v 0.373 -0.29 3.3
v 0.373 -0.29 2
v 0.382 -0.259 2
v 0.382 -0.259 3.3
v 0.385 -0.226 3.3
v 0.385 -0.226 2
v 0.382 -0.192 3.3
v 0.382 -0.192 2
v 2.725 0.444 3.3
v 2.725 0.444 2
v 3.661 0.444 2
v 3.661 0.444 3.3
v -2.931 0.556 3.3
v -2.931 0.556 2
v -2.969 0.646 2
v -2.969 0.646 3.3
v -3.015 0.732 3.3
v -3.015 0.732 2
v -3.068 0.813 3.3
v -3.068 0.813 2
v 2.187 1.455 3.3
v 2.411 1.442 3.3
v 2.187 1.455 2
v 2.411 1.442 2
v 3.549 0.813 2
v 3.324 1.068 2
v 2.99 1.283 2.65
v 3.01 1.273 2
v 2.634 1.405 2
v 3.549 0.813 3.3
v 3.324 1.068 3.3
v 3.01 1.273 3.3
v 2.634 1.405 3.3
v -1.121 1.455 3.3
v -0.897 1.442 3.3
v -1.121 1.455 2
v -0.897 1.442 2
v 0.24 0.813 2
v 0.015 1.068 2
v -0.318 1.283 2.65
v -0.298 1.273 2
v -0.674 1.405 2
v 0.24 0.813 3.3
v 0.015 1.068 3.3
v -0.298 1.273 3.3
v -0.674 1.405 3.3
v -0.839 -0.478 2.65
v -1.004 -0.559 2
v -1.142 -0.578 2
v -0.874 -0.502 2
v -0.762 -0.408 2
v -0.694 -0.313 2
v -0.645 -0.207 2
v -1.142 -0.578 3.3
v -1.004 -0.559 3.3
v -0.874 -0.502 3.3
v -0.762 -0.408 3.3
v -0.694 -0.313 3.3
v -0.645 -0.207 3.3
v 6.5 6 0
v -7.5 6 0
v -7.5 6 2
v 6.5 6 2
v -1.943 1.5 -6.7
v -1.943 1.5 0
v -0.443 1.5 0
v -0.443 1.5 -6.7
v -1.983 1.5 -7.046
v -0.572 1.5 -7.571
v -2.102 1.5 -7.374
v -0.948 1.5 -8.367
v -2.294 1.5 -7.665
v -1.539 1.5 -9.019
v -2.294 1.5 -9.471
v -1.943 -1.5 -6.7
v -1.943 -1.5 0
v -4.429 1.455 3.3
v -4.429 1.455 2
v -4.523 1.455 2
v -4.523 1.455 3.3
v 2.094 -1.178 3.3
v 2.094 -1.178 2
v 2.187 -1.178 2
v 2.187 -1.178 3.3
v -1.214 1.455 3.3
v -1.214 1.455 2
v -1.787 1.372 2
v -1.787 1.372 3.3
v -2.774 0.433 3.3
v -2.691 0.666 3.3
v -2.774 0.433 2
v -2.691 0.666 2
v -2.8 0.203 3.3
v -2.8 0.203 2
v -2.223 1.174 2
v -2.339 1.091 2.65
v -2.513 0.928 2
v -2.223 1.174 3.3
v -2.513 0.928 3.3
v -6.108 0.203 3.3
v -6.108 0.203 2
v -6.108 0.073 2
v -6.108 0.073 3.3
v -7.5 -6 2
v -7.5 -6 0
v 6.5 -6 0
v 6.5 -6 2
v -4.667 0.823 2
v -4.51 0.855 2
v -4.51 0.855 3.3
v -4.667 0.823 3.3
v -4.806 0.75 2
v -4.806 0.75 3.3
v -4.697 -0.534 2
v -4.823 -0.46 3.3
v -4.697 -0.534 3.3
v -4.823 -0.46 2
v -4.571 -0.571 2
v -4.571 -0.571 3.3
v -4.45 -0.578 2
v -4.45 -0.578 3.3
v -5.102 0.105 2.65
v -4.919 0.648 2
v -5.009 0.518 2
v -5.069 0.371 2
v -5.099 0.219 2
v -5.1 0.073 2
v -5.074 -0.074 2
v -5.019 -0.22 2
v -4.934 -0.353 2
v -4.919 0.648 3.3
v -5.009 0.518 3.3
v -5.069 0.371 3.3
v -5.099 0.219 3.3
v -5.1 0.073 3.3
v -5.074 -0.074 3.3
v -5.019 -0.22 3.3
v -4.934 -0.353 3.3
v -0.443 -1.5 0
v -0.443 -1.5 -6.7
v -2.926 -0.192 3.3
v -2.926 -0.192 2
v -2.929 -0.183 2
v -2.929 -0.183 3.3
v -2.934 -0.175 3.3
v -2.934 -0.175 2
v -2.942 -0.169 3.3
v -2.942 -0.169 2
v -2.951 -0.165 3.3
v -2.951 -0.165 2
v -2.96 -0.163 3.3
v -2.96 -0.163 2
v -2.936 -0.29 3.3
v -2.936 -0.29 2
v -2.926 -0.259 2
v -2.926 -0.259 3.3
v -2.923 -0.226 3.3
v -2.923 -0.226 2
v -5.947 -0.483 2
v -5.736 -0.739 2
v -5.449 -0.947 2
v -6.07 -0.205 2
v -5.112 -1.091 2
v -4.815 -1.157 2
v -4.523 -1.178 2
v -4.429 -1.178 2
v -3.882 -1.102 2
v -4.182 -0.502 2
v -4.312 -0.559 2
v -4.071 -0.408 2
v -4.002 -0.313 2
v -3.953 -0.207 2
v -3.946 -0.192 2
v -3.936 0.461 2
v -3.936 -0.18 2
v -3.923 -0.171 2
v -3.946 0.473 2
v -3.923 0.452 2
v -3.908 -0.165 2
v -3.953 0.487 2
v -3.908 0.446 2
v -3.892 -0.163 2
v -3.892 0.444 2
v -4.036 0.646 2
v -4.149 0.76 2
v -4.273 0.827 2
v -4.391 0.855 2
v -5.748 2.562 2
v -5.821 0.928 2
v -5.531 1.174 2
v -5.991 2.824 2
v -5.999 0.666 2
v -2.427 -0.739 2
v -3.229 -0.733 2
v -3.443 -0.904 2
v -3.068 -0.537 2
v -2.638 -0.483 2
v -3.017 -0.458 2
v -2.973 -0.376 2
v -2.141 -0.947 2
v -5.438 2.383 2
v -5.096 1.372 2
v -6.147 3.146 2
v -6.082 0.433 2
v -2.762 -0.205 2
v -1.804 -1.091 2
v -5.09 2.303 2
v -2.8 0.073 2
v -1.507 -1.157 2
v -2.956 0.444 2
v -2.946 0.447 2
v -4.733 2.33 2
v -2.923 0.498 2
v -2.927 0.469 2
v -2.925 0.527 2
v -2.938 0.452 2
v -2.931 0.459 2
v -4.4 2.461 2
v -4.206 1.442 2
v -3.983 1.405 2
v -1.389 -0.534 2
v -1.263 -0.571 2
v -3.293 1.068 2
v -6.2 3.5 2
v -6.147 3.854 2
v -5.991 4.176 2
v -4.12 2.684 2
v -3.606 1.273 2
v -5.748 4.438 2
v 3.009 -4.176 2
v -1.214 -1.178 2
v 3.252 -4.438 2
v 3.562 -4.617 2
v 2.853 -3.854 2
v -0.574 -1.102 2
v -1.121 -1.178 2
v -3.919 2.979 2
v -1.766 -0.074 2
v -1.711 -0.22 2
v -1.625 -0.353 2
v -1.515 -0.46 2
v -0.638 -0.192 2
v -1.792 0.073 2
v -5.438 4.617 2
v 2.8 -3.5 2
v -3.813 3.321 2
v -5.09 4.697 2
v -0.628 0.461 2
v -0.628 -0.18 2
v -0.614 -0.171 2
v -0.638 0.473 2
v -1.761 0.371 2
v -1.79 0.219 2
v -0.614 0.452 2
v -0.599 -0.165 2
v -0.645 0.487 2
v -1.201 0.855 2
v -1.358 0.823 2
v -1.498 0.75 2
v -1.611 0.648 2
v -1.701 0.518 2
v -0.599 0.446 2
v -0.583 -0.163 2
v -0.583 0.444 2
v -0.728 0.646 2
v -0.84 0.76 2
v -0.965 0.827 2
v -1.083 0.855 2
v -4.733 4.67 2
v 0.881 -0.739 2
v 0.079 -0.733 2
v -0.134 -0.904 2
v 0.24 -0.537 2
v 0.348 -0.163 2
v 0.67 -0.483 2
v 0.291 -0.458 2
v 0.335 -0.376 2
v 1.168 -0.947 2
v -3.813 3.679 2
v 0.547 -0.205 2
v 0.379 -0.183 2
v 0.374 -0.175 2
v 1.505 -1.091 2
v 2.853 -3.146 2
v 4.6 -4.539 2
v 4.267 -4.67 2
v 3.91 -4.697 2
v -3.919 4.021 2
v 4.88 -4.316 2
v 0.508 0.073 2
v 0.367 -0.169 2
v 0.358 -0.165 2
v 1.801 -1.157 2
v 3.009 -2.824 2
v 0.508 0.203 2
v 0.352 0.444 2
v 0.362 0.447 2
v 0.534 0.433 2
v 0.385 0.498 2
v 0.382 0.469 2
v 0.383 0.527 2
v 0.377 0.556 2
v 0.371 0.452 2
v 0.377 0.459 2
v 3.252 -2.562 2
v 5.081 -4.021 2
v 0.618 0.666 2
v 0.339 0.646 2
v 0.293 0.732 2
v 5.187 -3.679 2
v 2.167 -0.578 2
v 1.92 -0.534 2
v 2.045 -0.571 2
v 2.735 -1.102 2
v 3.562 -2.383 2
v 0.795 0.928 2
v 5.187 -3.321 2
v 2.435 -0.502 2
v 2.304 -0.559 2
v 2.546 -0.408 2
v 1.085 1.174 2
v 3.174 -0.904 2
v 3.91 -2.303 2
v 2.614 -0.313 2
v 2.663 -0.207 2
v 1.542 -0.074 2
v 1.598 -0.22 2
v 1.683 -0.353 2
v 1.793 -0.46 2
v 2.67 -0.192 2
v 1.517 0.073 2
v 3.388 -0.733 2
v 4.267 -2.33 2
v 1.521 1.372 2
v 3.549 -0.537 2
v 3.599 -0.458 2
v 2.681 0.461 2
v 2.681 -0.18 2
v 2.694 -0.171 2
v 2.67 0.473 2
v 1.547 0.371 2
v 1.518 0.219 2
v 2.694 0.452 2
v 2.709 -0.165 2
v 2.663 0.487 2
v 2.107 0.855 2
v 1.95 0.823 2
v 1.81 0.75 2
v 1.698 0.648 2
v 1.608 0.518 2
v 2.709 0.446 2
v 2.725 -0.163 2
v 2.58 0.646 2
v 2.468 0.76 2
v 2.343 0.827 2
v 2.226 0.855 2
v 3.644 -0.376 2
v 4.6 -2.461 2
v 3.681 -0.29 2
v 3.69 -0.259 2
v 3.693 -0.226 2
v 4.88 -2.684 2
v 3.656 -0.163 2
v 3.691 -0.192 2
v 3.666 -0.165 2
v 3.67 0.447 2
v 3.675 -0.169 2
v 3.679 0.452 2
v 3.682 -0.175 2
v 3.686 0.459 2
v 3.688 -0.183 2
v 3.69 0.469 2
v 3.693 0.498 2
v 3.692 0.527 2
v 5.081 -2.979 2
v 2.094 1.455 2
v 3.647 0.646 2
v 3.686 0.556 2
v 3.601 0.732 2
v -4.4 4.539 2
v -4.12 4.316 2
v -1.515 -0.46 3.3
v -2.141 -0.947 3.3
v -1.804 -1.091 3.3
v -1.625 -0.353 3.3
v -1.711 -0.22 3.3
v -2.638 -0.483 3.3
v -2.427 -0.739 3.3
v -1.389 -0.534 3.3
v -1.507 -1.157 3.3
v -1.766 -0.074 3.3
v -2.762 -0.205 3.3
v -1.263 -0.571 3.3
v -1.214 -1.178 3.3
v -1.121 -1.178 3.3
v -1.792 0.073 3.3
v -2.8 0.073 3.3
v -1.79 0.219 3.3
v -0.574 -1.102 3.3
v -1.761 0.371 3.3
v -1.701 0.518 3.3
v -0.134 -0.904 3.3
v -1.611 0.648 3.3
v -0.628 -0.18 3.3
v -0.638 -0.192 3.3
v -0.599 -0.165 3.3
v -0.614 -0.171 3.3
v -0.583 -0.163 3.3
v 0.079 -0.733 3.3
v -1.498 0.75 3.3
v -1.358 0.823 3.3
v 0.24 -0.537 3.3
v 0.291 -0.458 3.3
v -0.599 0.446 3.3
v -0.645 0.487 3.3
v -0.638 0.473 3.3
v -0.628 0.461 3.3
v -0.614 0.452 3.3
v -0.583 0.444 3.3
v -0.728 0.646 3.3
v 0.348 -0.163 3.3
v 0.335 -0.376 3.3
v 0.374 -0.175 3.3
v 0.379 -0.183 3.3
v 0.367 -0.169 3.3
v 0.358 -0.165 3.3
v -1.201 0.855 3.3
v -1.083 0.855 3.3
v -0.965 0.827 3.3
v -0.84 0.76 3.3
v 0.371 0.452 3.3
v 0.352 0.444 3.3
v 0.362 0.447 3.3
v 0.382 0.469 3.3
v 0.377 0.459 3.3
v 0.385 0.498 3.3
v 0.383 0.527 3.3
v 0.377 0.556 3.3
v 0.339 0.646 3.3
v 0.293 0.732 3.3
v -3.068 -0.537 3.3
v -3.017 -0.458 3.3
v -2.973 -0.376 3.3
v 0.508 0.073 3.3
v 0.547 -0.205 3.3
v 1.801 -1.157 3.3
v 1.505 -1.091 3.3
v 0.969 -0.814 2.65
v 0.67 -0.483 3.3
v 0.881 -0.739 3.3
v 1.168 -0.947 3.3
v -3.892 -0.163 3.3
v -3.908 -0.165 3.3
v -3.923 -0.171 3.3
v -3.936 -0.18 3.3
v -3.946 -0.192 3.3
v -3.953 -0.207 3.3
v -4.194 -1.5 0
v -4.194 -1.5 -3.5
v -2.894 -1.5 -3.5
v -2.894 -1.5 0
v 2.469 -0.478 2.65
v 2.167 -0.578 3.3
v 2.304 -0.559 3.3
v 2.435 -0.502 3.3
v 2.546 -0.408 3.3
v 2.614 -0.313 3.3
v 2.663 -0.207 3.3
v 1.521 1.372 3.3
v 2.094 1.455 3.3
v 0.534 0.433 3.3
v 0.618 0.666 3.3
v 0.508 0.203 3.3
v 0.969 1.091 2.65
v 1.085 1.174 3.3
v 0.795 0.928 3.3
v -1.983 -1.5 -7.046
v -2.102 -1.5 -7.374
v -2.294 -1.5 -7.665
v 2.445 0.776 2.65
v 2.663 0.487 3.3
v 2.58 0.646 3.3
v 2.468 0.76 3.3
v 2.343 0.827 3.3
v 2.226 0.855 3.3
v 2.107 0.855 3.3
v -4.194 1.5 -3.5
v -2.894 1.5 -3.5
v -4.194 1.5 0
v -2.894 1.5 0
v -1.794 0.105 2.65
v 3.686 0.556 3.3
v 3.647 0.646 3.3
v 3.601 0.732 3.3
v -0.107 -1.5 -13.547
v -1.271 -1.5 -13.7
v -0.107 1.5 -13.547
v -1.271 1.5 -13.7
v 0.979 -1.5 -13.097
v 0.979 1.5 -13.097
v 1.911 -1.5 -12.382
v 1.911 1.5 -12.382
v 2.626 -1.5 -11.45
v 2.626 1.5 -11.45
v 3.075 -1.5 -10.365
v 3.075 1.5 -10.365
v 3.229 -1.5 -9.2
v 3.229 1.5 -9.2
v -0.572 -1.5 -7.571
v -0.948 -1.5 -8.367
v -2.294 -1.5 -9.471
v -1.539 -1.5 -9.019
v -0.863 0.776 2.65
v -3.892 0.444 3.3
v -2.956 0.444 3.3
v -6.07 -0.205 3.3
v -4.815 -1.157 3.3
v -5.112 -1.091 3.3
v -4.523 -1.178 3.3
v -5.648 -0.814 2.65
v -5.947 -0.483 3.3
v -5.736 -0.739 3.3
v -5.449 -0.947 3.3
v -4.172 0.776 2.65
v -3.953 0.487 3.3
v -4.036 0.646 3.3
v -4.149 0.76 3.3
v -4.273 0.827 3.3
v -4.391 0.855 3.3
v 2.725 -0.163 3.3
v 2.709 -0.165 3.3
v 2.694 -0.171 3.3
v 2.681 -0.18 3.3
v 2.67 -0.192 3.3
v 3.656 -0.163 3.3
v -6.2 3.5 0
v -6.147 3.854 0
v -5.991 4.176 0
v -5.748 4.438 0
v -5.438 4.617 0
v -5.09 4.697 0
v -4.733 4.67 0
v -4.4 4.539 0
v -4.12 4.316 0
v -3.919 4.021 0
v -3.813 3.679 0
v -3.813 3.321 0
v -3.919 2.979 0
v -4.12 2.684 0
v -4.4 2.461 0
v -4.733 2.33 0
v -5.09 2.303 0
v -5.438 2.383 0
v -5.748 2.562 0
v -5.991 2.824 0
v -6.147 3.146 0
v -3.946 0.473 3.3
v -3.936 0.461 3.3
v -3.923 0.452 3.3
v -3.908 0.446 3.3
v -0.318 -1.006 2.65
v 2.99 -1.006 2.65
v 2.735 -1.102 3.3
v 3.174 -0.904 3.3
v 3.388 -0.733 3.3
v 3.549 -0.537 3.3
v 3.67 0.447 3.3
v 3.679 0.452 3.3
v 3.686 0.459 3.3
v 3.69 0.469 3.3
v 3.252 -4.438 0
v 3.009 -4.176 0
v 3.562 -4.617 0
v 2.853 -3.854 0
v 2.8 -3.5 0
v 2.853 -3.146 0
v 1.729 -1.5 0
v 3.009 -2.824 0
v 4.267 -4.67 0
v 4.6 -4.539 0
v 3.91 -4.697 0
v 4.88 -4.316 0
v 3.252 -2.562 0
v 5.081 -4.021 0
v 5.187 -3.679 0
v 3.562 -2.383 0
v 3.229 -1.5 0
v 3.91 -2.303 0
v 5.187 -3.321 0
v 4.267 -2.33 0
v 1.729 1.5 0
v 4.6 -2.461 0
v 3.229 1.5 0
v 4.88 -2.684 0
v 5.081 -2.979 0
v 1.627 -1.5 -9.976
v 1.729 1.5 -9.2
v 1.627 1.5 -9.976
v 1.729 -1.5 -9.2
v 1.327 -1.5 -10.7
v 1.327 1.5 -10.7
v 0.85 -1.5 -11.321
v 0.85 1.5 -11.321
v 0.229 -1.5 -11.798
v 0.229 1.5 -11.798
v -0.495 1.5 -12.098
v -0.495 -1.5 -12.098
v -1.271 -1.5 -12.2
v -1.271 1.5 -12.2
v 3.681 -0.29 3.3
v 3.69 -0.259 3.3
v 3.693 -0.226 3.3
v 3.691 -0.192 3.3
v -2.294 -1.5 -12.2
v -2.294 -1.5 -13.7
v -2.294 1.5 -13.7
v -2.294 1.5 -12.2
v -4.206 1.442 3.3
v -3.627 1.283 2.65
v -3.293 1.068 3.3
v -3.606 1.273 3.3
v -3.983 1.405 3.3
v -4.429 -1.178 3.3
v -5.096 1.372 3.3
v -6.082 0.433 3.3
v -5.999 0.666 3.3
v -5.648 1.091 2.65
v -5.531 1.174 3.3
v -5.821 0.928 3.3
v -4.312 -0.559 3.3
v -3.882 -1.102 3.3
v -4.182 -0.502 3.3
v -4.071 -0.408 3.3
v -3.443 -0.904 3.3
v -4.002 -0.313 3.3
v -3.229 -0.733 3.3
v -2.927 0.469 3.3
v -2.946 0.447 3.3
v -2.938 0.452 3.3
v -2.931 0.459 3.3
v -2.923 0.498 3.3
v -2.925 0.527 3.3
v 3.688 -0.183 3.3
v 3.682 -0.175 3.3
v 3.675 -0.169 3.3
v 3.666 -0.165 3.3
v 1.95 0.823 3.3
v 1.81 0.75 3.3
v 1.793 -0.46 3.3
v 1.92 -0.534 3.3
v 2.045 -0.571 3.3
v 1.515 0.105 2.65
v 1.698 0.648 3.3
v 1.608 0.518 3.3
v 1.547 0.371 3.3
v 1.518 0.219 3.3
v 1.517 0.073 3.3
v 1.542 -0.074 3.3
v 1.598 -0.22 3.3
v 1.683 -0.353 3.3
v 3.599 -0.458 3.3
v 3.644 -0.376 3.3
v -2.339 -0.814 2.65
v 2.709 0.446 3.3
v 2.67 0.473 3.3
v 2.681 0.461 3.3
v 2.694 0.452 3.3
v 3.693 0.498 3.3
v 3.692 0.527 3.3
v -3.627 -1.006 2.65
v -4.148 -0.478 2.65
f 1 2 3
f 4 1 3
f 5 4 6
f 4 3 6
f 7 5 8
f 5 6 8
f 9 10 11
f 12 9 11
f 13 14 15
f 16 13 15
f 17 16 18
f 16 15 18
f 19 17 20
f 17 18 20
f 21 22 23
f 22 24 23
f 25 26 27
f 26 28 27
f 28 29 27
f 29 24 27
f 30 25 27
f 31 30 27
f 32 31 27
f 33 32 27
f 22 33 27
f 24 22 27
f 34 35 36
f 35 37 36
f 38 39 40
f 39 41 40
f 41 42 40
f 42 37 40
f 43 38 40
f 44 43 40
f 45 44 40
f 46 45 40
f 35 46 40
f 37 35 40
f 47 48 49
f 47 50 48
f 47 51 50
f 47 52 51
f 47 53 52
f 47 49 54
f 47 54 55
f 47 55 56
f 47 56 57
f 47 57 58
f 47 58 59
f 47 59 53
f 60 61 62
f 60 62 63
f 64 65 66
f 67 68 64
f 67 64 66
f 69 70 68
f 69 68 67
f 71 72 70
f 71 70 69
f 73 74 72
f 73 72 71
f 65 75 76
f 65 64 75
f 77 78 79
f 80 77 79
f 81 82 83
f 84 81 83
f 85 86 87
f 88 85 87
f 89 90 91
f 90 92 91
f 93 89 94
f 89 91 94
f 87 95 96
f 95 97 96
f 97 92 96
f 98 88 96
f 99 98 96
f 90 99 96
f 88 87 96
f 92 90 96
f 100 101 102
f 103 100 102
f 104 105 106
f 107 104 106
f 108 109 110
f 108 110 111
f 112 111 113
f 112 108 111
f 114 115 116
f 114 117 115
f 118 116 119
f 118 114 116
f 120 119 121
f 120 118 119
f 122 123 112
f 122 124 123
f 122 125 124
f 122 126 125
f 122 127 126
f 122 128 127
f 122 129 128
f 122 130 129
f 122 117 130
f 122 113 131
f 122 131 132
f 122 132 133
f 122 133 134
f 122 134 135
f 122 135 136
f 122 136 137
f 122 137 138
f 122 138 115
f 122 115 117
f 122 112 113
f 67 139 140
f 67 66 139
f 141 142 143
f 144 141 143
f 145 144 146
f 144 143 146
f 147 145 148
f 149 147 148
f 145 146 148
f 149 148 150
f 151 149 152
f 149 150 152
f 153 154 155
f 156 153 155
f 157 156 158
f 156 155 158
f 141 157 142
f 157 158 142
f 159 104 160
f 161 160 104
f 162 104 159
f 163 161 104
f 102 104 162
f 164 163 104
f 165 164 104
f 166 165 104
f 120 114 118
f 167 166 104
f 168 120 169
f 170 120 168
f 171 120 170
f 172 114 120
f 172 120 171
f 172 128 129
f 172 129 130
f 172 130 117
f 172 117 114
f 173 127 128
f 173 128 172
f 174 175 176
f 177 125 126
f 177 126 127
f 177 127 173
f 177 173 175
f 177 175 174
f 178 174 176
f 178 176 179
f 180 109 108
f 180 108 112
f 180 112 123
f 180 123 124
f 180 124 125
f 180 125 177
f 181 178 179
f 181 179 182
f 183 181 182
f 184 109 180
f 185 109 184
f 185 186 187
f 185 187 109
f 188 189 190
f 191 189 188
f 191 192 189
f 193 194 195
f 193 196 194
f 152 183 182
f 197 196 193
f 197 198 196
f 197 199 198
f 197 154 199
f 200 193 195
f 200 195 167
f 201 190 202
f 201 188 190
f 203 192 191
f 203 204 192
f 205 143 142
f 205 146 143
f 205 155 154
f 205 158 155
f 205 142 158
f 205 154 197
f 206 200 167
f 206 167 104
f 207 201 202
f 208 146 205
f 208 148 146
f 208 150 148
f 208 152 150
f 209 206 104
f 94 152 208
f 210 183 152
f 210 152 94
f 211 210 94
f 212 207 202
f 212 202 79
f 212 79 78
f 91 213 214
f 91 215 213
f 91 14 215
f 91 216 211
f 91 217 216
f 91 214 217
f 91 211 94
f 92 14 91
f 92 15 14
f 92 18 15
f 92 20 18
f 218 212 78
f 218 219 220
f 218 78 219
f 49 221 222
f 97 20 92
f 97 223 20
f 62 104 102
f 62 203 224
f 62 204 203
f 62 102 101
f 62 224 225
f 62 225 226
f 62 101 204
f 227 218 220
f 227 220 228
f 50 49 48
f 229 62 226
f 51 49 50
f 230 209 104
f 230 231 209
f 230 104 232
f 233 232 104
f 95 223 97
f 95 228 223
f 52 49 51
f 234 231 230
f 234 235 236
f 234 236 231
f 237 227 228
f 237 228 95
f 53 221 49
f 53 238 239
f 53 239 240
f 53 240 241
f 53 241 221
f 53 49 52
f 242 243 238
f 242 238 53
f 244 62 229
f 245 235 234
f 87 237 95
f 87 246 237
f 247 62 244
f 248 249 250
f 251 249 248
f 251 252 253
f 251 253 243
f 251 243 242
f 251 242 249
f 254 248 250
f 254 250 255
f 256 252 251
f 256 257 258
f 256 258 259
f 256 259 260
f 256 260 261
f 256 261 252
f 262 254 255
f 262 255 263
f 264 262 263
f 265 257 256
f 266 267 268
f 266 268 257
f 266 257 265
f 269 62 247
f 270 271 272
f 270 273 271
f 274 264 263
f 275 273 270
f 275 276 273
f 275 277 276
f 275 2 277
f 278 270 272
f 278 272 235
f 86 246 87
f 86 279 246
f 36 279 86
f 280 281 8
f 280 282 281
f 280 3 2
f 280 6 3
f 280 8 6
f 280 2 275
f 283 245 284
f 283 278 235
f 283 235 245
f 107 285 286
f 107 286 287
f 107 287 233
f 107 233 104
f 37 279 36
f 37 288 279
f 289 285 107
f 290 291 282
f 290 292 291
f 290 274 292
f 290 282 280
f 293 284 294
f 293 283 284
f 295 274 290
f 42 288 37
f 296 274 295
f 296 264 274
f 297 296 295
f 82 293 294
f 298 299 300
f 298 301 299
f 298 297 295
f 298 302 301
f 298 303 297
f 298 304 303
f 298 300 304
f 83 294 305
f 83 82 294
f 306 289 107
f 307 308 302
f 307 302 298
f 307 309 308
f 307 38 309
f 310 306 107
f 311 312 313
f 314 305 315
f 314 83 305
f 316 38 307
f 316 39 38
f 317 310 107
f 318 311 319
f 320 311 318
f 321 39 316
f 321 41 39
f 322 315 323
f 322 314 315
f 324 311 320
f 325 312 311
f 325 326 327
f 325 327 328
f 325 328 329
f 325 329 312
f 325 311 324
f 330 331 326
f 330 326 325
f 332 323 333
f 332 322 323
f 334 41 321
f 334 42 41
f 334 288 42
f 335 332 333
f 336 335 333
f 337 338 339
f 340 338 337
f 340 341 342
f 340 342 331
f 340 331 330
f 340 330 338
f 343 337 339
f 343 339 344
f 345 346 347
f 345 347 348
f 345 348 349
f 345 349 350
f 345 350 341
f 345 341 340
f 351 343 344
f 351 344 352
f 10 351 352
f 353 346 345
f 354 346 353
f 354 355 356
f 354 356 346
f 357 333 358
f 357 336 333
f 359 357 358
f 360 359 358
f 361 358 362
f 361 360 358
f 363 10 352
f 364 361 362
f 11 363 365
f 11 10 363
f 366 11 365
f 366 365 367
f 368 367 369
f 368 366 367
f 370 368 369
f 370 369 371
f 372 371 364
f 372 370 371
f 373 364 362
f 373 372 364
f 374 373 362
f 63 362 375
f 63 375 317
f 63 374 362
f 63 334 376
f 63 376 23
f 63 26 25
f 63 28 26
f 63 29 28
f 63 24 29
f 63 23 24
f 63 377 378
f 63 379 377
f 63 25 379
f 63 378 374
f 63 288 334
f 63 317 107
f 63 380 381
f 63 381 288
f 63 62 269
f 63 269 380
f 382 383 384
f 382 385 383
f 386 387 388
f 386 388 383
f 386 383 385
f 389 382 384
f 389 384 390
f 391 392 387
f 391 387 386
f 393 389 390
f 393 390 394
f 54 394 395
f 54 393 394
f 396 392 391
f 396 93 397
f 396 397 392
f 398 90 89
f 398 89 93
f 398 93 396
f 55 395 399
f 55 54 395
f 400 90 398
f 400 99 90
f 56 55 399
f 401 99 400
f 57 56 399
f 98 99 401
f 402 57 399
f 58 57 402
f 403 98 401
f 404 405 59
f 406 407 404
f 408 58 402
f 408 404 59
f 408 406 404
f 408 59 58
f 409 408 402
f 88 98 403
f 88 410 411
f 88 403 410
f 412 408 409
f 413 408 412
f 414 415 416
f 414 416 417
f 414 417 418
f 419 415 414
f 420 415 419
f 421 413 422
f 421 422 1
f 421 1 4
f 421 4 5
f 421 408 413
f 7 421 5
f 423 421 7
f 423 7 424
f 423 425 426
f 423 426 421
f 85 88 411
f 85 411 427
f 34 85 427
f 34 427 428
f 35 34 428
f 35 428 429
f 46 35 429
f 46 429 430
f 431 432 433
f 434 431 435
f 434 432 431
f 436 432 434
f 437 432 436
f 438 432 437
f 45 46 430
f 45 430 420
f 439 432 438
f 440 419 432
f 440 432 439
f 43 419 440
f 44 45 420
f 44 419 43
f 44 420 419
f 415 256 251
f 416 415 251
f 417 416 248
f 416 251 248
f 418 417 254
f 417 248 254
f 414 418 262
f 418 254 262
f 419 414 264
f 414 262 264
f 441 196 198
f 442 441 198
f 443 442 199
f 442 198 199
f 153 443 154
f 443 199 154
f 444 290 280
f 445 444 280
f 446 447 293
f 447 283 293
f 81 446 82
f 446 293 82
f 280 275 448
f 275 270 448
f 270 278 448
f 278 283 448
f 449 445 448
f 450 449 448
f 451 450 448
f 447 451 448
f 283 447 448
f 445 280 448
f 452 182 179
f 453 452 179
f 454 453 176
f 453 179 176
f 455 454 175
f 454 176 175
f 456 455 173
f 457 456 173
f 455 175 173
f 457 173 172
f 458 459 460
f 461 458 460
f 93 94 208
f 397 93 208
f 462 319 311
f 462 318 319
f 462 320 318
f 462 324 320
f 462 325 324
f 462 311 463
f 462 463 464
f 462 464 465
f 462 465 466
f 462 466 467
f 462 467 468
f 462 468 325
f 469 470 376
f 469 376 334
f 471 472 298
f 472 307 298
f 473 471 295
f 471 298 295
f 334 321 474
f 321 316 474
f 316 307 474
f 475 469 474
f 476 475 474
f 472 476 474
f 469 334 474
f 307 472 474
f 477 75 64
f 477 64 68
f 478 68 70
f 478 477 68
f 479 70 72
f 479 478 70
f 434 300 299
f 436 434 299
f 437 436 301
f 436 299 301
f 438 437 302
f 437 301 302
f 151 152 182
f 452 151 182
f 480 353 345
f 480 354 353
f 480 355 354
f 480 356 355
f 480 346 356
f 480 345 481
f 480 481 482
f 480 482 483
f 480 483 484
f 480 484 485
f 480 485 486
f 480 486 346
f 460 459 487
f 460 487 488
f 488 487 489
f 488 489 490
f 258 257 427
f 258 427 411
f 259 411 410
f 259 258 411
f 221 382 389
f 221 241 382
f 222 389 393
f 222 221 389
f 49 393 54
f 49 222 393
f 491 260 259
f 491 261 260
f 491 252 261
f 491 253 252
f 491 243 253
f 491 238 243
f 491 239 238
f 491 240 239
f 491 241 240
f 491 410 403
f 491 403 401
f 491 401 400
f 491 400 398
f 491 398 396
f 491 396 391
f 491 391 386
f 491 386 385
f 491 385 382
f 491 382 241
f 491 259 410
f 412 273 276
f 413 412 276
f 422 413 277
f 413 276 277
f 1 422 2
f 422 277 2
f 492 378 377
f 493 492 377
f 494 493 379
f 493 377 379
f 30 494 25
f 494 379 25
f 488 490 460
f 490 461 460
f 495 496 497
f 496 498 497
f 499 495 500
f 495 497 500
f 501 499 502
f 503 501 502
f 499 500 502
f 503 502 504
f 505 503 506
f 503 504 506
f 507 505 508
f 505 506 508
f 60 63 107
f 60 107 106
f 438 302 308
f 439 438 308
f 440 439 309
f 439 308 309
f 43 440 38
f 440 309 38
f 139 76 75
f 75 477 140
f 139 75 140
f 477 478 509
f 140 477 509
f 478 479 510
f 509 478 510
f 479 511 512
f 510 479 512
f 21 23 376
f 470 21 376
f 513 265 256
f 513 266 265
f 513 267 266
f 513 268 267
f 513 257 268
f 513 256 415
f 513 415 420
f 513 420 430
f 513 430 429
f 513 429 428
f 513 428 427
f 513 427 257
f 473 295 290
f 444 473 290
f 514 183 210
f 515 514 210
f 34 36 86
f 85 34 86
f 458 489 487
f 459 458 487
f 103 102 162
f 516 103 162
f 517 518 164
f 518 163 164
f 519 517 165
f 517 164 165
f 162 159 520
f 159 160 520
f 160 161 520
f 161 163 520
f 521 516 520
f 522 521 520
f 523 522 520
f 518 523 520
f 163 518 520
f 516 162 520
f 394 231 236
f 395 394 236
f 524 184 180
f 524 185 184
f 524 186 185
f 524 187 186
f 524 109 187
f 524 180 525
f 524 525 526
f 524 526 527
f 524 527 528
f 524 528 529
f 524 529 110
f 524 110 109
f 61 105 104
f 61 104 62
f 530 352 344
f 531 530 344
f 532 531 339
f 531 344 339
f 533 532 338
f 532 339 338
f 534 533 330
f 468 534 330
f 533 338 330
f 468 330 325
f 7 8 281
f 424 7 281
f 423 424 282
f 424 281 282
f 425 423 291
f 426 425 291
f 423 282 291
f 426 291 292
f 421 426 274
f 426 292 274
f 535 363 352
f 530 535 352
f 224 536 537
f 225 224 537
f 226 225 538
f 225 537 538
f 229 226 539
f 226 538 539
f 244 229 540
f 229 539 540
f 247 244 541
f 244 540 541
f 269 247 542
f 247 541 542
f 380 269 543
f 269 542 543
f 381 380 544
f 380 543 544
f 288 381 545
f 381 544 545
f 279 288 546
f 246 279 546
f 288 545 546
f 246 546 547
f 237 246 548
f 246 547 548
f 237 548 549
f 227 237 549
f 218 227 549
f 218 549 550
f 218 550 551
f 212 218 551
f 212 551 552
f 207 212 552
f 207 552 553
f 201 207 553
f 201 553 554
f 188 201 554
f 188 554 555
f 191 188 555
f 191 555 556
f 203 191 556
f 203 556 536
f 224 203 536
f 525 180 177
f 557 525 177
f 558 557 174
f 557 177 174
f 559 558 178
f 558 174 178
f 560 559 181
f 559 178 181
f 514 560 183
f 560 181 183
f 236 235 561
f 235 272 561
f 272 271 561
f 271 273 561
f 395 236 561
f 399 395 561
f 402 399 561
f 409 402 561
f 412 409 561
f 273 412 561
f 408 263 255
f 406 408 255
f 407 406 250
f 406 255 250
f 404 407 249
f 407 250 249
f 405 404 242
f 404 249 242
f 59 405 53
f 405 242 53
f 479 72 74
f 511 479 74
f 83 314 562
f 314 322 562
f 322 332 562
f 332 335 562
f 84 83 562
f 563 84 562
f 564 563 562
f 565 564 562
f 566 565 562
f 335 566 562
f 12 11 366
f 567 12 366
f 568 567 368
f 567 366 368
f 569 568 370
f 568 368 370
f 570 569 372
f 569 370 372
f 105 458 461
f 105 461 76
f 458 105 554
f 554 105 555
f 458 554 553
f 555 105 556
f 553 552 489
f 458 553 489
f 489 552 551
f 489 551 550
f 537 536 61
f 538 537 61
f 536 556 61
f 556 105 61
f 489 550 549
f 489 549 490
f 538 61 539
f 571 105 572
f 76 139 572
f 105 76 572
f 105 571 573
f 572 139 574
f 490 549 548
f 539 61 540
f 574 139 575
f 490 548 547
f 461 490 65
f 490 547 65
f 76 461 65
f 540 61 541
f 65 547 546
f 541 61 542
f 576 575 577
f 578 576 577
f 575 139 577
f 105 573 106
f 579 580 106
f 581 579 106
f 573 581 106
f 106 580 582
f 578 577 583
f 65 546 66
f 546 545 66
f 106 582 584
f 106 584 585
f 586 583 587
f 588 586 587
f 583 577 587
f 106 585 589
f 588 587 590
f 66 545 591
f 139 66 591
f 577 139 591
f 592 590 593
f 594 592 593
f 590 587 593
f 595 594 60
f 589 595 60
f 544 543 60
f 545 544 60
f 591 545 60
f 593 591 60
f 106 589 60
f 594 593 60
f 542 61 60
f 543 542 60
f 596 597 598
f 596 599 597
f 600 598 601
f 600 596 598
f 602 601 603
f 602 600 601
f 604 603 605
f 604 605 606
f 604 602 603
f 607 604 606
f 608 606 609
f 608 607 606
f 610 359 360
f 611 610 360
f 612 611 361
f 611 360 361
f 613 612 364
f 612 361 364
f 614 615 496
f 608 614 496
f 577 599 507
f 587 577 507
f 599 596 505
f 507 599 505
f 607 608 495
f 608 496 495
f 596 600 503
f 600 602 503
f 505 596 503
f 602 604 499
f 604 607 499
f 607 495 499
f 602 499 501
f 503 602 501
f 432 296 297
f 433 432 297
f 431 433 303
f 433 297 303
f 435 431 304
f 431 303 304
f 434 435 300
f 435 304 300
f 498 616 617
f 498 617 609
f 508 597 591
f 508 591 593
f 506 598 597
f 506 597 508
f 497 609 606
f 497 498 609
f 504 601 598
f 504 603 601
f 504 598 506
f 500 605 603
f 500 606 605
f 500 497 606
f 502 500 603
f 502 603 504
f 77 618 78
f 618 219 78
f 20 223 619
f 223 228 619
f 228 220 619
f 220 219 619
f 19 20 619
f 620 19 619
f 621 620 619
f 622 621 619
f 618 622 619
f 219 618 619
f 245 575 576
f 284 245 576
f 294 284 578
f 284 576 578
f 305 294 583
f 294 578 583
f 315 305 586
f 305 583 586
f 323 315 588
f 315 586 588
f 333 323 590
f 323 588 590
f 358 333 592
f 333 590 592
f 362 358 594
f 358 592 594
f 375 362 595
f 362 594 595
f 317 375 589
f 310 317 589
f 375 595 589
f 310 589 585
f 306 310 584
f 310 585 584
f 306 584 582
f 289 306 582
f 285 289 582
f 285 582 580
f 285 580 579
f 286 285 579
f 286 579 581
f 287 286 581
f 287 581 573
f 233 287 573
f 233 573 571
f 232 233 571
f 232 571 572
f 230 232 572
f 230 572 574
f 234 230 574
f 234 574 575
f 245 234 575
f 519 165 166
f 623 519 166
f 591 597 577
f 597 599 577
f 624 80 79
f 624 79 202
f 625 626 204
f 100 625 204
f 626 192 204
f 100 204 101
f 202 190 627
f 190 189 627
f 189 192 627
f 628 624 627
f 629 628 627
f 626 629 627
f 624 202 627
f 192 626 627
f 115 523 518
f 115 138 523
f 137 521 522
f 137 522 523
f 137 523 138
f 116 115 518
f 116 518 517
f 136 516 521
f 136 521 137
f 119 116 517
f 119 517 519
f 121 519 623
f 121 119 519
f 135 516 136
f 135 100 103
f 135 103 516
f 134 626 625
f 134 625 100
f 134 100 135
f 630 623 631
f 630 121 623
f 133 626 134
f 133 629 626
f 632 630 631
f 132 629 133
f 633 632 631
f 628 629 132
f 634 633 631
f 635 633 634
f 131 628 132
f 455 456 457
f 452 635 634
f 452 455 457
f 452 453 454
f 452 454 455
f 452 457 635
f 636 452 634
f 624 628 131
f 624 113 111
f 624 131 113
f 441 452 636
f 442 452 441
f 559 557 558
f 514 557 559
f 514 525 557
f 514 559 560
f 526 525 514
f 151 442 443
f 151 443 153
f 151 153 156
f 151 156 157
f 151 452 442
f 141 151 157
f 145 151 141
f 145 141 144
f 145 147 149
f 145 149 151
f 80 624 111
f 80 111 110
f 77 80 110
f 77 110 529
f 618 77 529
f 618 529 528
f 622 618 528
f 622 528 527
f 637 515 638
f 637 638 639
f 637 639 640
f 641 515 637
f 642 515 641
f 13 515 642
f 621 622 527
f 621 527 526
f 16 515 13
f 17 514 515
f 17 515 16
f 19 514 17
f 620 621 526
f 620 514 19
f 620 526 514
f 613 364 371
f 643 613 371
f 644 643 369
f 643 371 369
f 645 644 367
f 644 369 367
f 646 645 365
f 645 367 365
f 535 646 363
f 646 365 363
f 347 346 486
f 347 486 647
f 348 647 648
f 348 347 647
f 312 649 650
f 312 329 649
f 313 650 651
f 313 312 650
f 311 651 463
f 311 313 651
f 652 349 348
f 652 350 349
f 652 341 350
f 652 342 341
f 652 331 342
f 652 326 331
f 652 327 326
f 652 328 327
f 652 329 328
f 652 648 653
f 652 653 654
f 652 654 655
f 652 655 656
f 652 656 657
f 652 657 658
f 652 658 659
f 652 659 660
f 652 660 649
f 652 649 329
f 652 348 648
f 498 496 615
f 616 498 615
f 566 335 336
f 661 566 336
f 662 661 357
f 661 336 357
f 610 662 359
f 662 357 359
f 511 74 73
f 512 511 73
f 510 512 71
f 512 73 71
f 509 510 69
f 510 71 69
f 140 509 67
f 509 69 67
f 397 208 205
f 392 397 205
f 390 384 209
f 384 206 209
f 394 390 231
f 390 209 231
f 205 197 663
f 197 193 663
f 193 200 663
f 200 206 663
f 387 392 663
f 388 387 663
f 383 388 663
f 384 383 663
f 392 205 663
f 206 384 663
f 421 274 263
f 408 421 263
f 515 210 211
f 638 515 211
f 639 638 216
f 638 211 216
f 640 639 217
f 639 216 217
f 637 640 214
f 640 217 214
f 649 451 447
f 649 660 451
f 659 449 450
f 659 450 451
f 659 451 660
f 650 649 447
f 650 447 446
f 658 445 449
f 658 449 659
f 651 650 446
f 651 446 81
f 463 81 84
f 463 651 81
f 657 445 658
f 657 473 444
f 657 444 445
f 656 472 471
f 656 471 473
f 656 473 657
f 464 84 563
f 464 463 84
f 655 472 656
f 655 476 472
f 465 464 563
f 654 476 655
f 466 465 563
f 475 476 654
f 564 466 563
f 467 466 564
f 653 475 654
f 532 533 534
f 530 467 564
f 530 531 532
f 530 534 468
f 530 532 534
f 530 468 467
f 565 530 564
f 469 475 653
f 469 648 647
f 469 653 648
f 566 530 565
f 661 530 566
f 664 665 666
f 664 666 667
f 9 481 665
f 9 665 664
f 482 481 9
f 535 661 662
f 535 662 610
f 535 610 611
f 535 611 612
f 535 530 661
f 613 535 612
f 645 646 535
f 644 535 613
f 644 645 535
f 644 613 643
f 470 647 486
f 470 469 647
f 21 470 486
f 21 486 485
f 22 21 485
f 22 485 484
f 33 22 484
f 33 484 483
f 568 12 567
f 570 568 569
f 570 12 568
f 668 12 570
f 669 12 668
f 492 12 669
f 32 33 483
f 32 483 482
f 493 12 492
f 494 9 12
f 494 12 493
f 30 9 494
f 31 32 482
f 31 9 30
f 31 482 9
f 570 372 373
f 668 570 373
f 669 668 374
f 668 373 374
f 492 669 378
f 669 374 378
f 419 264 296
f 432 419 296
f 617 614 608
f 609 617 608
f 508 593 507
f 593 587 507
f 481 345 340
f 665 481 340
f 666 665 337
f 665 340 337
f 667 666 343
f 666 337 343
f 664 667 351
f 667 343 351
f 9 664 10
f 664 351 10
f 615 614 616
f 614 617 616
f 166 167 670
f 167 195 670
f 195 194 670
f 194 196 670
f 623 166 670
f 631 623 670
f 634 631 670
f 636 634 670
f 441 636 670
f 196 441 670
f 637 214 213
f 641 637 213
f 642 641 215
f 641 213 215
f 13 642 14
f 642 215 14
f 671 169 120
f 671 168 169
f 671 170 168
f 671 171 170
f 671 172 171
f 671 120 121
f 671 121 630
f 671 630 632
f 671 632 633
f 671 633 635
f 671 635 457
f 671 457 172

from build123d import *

# Parameters (mm, degrees)
SKETCH1_W           = 15
SKETCH1_H           = 12
BOSS_EXTRUDE1_DEPTH = 2
BOSS_EXTRUDE2_DEPTH = 2
SKETCH3_W           = 1.5
SKETCH3_H           = 3.5
BOSS_EXTRUDE3_DEPTH = 1.5
FILLET3_R           = 1.5
FILLET4_R           = 3
FILLET5_R           = 3
FILLET6_R           = 4.5
SKETCH4_W           = 2
SKETCH4_H           = 12
CUT_EXTRUDE1_DEPTH  = 1
SKETCH5_R           = 1.2
CUT_EXTRUDE2_DEPTH  = 17.731407672
CUT_EXTRUDE3_START  = -0.7
CUT_EXTRUDE3_DEPTH  = 0.7
SKETCH7_W           = 1.148621372
SKETCH7_H           = 6.2
CUT_EXTRUDE4_DEPTH  = 18.325992122
SKETCH8_W           = 0.2
SKETCH8_H           = 3.5
CUT_EXTRUDE5_DEPTH  = 18.325992122


with BuildPart() as part:
    # Sketch1 → Boss-Extrude1 (new body)
    with BuildSketch(Plane.XY):
        Rectangle(SKETCH1_W, SKETCH1_H)
    extrude(amount=BOSS_EXTRUDE1_DEPTH)

    # Sketch2 → Boss-Extrude2 (add)
    with BuildSketch(Plane.XY.offset(2)):
        with BuildLine():
            Line((-0.583484164, 0.443787032), (0.352350759, 0.443787032))
            ThreePointArc((0.352350759, 0.443787032), (0.370660979, 0.451874829), (0.381594807, 0.468641703))
            ThreePointArc((0.381594807, 0.468641703), (0.38478126, 0.512633483), (0.377406248, 0.556119567))
            ThreePointArc((0.377406248, 0.556119567), (0.316958398, 0.689104808), (0.240244136, 0.81341868))
            add(Edge.make_bspline(
                [(0.240244136, 0.81341868), (-0.178053426, 1.454553053), (-1.120854898, 1.454553053)],
                knots=[3.484341046, 3.484341046, 3.484341046, 4.522924348, 4.522924348, 4.522924348], degree=2, weights=[1, 0.868170926, 1]))
            Line((-1.120854898, 1.454553053), (-1.214475951, 1.454553068))
            add(Edge.make_bspline(
                [(-1.214475951, 1.454553068), (-2.800132813, 1.454553068), (-2.800132813, 0.203397992)],
                knots=[1.670440536, 1.670440536, 1.670440536, 3.203377674, 3.203377674, 3.203377674], degree=2, weights=[1, 0.720364542, 1]))
            Line((-2.800132813, 0.203397992), (-2.800132806, 0.073267738))
            add(Edge.make_bspline(
                [(-2.800132806, 0.073267738), (-2.800132806, -1.177887338), (-1.214475944, -1.177887338)],
                knots=[3.079807634, 3.079807634, 3.079807634, 4.612744771, 4.612744771, 4.612744771], degree=2, weights=[1, 0.720364542, 1]))
            Line((-1.214475944, -1.177887338), (-1.120854891, -1.177887375))
            add(Edge.make_bspline(
                [(-1.120854891, -1.177887375), (-0.178053419, -1.177887375), (0.240244143, -0.536753002)],
                knots=[1.760260959, 1.760260959, 1.760260959, 2.798844261, 2.798844261, 2.798844261], degree=2, weights=[1, 0.868170926, 1]))
            ThreePointArc((0.240244143, -0.536753002), (0.313994237, -0.417650167), (0.372658208, -0.290437354))
            ThreePointArc((0.372658208, -0.290437354), (0.384251196, -0.24211404), (0.382489087, -0.192450825))
            ThreePointArc((0.382489087, -0.192450825), (0.370484527, -0.171527836), (0.347824512, -0.163257123))
            Line((0.347824512, -0.163257123), (-0.58348421, -0.163257123))
            ThreePointArc((-0.58348421, -0.163257123), (-0.62125204, -0.175257922), (-0.645165579, -0.206858093))
            add(Edge.make_bspline(
                [(-1.141657158, -0.577741646), (-0.776549247, -0.578100851), (-0.645165579, -0.206858093)],
                knots=[5.955155363, 5.955155363, 5.955155363, 7.020735545, 7.020735545, 7.020735545], degree=2, weights=[1, 0.86139323, 1]))
            add(Edge.make_bspline(
                [(-1.201450314, 0.854894524), (-1.823540048, 0.823436889), (-1.793554178, 0.104979402), (-1.763568309, -0.613478086), (-1.141657158, -0.577741646)],
                knots=[0.039432941, 0.039432941, 0.039432941, 1.613207044, 1.613207044, 3.186981147, 3.186981147, 3.186981147], degree=2, weights=[1, 0.706053195, 1, 0.706053195, 1]))
            add(Edge.make_bspline(
                [(-0.645165584, 0.487388037), (-0.79140441, 0.900606071), (-1.201450314, 0.854894524)],
                knots=[2.404042441, 2.404042441, 2.404042441, 3.565685694, 3.565685694, 3.565685694], degree=2, weights=[1, 0.836012096, 1]))
            ThreePointArc((-0.645165584, 0.487388037), (-0.621252025, 0.455787841), (-0.583484164, 0.443787032))
        make_face()
        with BuildLine():
            Line((-3.89178871, 0.443787032), (-2.955953786, 0.443787032))
            ThreePointArc((-2.955953786, 0.443787032), (-2.937643536, 0.451874816), (-2.926709688, 0.468641703))
            ThreePointArc((-2.926709688, 0.468641703), (-2.923523234, 0.512633483), (-2.930898247, 0.556119567))
            ThreePointArc((-2.930898247, 0.556119567), (-2.991346096, 0.689104808), (-3.068060358, 0.81341868))
            add(Edge.make_bspline(
                [(-3.068060358, 0.81341868), (-3.48635792, 1.454553053), (-4.429159392, 1.454553053)],
                knots=[3.484341046, 3.484341046, 3.484341046, 4.522924348, 4.522924348, 4.522924348], degree=2, weights=[1, 0.868170926, 1]))
            Line((-4.429159392, 1.454553053), (-4.522780446, 1.454553068))
            add(Edge.make_bspline(
                [(-4.522780446, 1.454553068), (-6.108437307, 1.454553068), (-6.108437307, 0.203397992)],
                knots=[4.81203319, 4.81203319, 4.81203319, 6.344970327, 6.344970327, 6.344970327], degree=2, weights=[1, 0.720364542, 1]))
            Line((-6.108437307, 0.203397992), (-6.108437352, 0.073267738))
            add(Edge.make_bspline(
                [(-6.108437352, 0.073267738), (-6.108437352, -1.177887338), (-4.52278049, -1.177887338)],
                knots=[6.221400287, 6.221400287, 6.221400287, 7.754337425, 7.754337425, 7.754337425], degree=2, weights=[1, 0.720364542, 1]))
            Line((-4.52278049, -1.177887338), (-4.429159437, -1.177887375))
            add(Edge.make_bspline(
                [(-4.429159437, -1.177887375), (-3.486357965, -1.177887375), (-3.068060402, -0.536753002)],
                knots=[1.760260959, 1.760260959, 1.760260959, 2.798844261, 2.798844261, 2.798844261], degree=2, weights=[1, 0.868170926, 1]))
            ThreePointArc((-3.068060402, -0.536753002), (-2.994310308, -0.417650167), (-2.935646337, -0.290437354))
            ThreePointArc((-2.935646337, -0.290437354), (-2.92405335, -0.24211404), (-2.925815458, -0.192450825))
            ThreePointArc((-2.925815458, -0.192450825), (-2.937820019, -0.171527836), (-2.960480033, -0.163257123))
            Line((-2.960480033, -0.163257123), (-3.891788755, -0.163257123))
            ThreePointArc((-3.891788755, -0.163257123), (-3.929556585, -0.175257922), (-3.953470124, -0.206858093))
            add(Edge.make_bspline(
                [(-4.449961703, -0.577741646), (-4.084853792, -0.578100851), (-3.953470124, -0.206858093)],
                knots=[5.955155363, 5.955155363, 5.955155363, 7.020735545, 7.020735545, 7.020735545], degree=2, weights=[1, 0.86139323, 1]))
            add(Edge.make_bspline(
                [(-4.509754859, 0.854894524), (-5.131844593, 0.82343689), (-5.101858724, 0.104979402), (-5.071872854, -0.613478086), (-4.449961703, -0.577741646)],
                knots=[0.039432941, 0.039432941, 0.039432941, 1.613207044, 1.613207044, 3.186981147, 3.186981147, 3.186981147], degree=2, weights=[1, 0.706053195, 1, 0.706053195, 1]))
            add(Edge.make_bspline(
                [(-3.95347013, 0.487388037), (-4.099708956, 0.900606071), (-4.509754859, 0.854894524)],
                knots=[2.40404244, 2.40404244, 2.40404244, 3.565685694, 3.565685694, 3.565685694], degree=2, weights=[1, 0.836012096, 1]))
            ThreePointArc((-3.95347013, 0.487388037), (-3.92955657, 0.455787841), (-3.89178871, 0.443787032))
        make_face()
        with BuildLine():
            Line((2.724820382, 0.443787032), (3.660655305, 0.443787032))
            ThreePointArc((3.660655305, 0.443787032), (3.678965525, 0.451874829), (3.689899353, 0.468641703))
            ThreePointArc((3.689899353, 0.468641703), (3.693085806, 0.512633483), (3.685710794, 0.556119567))
            ThreePointArc((3.685710794, 0.556119567), (3.625262944, 0.689104808), (3.548548682, 0.81341868))
            add(Edge.make_bspline(
                [(3.548548682, 0.81341868), (3.13025112, 1.454553053), (2.187449648, 1.454553053)],
                knots=[0.342748392, 0.342748392, 0.342748392, 1.381331695, 1.381331695, 1.381331695], degree=2, weights=[1, 0.868170926, 1]))
            Line((2.187449648, 1.454553053), (2.093828595, 1.454553068))
            add(Edge.make_bspline(
                [(2.093828595, 1.454553068), (0.508171733, 1.454553068), (0.508171733, 0.203397992)],
                knots=[4.81203319, 4.81203319, 4.81203319, 6.344970327, 6.344970327, 6.344970327], degree=2, weights=[1, 0.720364542, 1]))
            Line((0.508171733, 0.203397992), (0.50817174, 0.073267738))
            add(Edge.make_bspline(
                [(0.50817174, 0.073267738), (0.50817174, -1.177887338), (2.093828602, -1.177887338)],
                knots=[3.079807634, 3.079807634, 3.079807634, 4.612744771, 4.612744771, 4.612744771], degree=2, weights=[1, 0.720364542, 1]))
            Line((2.093828602, -1.177887338), (2.187449655, -1.177887375))
            add(Edge.make_bspline(
                [(2.187449655, -1.177887375), (3.130251127, -1.177887375), (3.548548689, -0.536753002)],
                knots=[1.760260959, 1.760260959, 1.760260959, 2.798844261, 2.798844261, 2.798844261], degree=2, weights=[1, 0.868170926, 1]))
            ThreePointArc((3.548548689, -0.536753002), (3.622298783, -0.417650167), (3.680962754, -0.290437354))
            ThreePointArc((3.680962754, -0.290437354), (3.692555742, -0.24211404), (3.690793633, -0.192450825))
            ThreePointArc((3.690793633, -0.192450825), (3.678789073, -0.171527836), (3.656129058, -0.163257123))
            Line((3.656129058, -0.163257123), (2.724820336, -0.163257123))
            ThreePointArc((2.724820336, -0.163257123), (2.687052506, -0.175257922), (2.663138967, -0.206858093))
            add(Edge.make_bspline(
                [(2.166647388, -0.577741646), (2.531755299, -0.578100851), (2.663138967, -0.206858093)],
                knots=[5.955155363, 5.955155363, 5.955155363, 7.020735545, 7.020735545, 7.020735545], degree=2, weights=[1, 0.86139323, 1]))
            add(Edge.make_bspline(
                [(2.106854232, 0.854894524), (1.484764498, 0.823436889), (1.514750368, 0.104979402), (1.544736237, -0.613478086), (2.166647388, -0.577741646)],
                knots=[3.181025595, 3.181025595, 3.181025595, 4.754799698, 4.754799698, 6.328573801, 6.328573801, 6.328573801], degree=2, weights=[1, 0.706053195, 1, 0.706053195, 1]))
            add(Edge.make_bspline(
                [(2.663138962, 0.487388037), (2.516900136, 0.900606071), (2.106854232, 0.854894524)],
                knots=[5.545635094, 5.545635094, 5.545635094, 6.707278348, 6.707278348, 6.707278348], degree=2, weights=[1, 0.836012096, 1]))
            ThreePointArc((2.663138962, 0.487388037), (2.687052521, 0.455787841), (2.724820382, 0.443787032))
        make_face()
    extrude(amount=BOSS_EXTRUDE2_DEPTH)

    # Sketch3 → Boss-Extrude3 (add, symmetric)
    with BuildSketch(Plane(origin=(0, 0, 0), x_dir=(1, 0, 0), z_dir=(0, 1, 0))):
        Polygon((1.72873188, 0), (3.22873188, 0), (3.22873188, 13.7), (-3.442646753, 13.7), (-3.442646753, 12.2), (1.72873188, 12.2), align=None)
        with Locations((-3.644025381, 1.75)):
            Rectangle(SKETCH3_W, SKETCH3_H)
        Polygon((-1.942646753, 0), (-0.442646753, 0), (-0.442646753, 9.7), (-3.442646753, 9.7), (-3.442646753, 8.2), (-1.942646753, 8.2), align=None)
    extrude(amount=BOSS_EXTRUDE3_DEPTH, both=True)

    # Fillet3
    fillet3_edges = [part.edges().sort_by_distance(p)[0] for p in [
        (-1.942646753, 0, -8.2),
    ]]
    fillet(fillet3_edges, radius=FILLET3_R - 0.0001)  # a hair under: the kernel refuses the full size

    # Fillet4
    fillet4_edges = [part.edges().sort_by_distance(p)[0] for p in [
        (-0.442646753, 0, -9.7),
    ]]
    fillet(fillet4_edges, radius=FILLET4_R - 0.0001)  # a hair under: the kernel refuses the full size

    # Fillet5
    fillet5_edges = [part.edges().sort_by_distance(p)[0] for p in [
        (1.72873188, 0, -12.2),
    ]]
    fillet(fillet5_edges, radius=FILLET5_R)

    # Fillet6
    fillet6_edges = [part.edges().sort_by_distance(p)[0] for p in [
        (3.22873188, 0, -13.7),
    ]]
    fillet(fillet6_edges, radius=FILLET6_R)

    # Sketch4 → Cut-Extrude1 (cut)
    with BuildSketch(Plane(origin=(7.5, 0, 0), x_dir=(0, 0, -1), z_dir=(1, 0, 0))):
        with Locations((-1, 0)):
            Rectangle(SKETCH4_W, SKETCH4_H)
    extrude(amount=-CUT_EXTRUDE1_DEPTH, mode=Mode.SUBTRACT)

    # Sketch5 → Cut-Extrude2 (cut, through all)
    with BuildSketch(Plane(origin=(0, 0, 0), x_dir=(-1, 0, 0), z_dir=(0, 0, -1))):
        with Locations((-4, -3.5)):
            Circle(SKETCH5_R)
        with Locations((5, 3.5)):
            Circle(SKETCH5_R)
    extrude(amount=-CUT_EXTRUDE2_DEPTH, mode=Mode.SUBTRACT)

    # Sketch6 → Cut-Extrude3 (cut)
    with BuildSketch(Plane.XY.offset(4).offset(CUT_EXTRUDE3_START)):
        with BuildLine():
            Line((2.724820382, 0.443787032), (3.660655305, 0.443787032))
            ThreePointArc((3.660655305, 0.443787032), (3.678965525, 0.451874829), (3.689899353, 0.468641703))
            ThreePointArc((3.689899353, 0.468641703), (3.693085806, 0.512633483), (3.685710794, 0.556119567))
            ThreePointArc((3.685710794, 0.556119567), (3.625262944, 0.689104808), (3.548548682, 0.81341868))
            add(Edge.make_bspline(
                [(3.548548682, 0.81341868), (3.13025112, 1.454553053), (2.187449648, 1.454553053)],
                knots=[0.342748392, 0.342748392, 0.342748392, 1.381331695, 1.381331695, 1.381331695], degree=2, weights=[1, 0.868170926, 1]))
            Line((2.187449648, 1.454553053), (2.093828595, 1.454553068))
            add(Edge.make_bspline(
                [(2.093828595, 1.454553068), (0.508171733, 1.454553068), (0.508171733, 0.203397992)],
                knots=[4.81203319, 4.81203319, 4.81203319, 6.344970327, 6.344970327, 6.344970327], degree=2, weights=[1, 0.720364542, 1]))
            Line((0.508171733, 0.203397992), (0.50817174, 0.073267738))
            add(Edge.make_bspline(
                [(0.50817174, 0.073267738), (0.50817174, -1.177887338), (2.093828602, -1.177887338)],
                knots=[3.079807634, 3.079807634, 3.079807634, 4.612744771, 4.612744771, 4.612744771], degree=2, weights=[1, 0.720364542, 1]))
            Line((2.093828602, -1.177887338), (2.187449655, -1.177887375))
            add(Edge.make_bspline(
                [(2.187449655, -1.177887375), (3.130251127, -1.177887375), (3.548548689, -0.536753002)],
                knots=[1.760260959, 1.760260959, 1.760260959, 2.798844261, 2.798844261, 2.798844261], degree=2, weights=[1, 0.868170926, 1]))
            ThreePointArc((3.548548689, -0.536753002), (3.622298783, -0.417650167), (3.680962754, -0.290437354))
            ThreePointArc((3.680962754, -0.290437354), (3.692555742, -0.24211404), (3.690793633, -0.192450825))
            ThreePointArc((3.690793633, -0.192450825), (3.678789073, -0.171527836), (3.656129058, -0.163257123))
            Line((3.656129058, -0.163257123), (2.724820336, -0.163257123))
            ThreePointArc((2.724820336, -0.163257123), (2.687052506, -0.175257922), (2.663138967, -0.206858093))
            add(Edge.make_bspline(
                [(2.166647388, -0.577741646), (2.531755299, -0.578100851), (2.663138967, -0.206858093)],
                knots=[5.955155363, 5.955155363, 5.955155363, 7.020735545, 7.020735545, 7.020735545], degree=2, weights=[1, 0.86139323, 1]))
            add(Edge.make_bspline(
                [(2.106854232, 0.854894524), (1.484764498, 0.823436889), (1.514750368, 0.104979402), (1.544736237, -0.613478086), (2.166647388, -0.577741646)],
                knots=[3.181025595, 3.181025595, 3.181025595, 4.754799698, 4.754799698, 6.328573801, 6.328573801, 6.328573801], degree=2, weights=[1, 0.706053195, 1, 0.706053195, 1]))
            add(Edge.make_bspline(
                [(2.663138962, 0.487388037), (2.516900136, 0.900606071), (2.106854232, 0.854894524)],
                knots=[2.404042441, 2.404042441, 2.404042441, 3.565685694, 3.565685694, 3.565685694], degree=2, weights=[1, 0.836012096, 1]))
            ThreePointArc((2.663138962, 0.487388037), (2.687052521, 0.455787841), (2.724820382, 0.443787032))
        make_face()
        with BuildLine():
            Line((-0.583484164, 0.443787032), (0.352350759, 0.443787032))
            ThreePointArc((0.352350759, 0.443787032), (0.370660979, 0.451874829), (0.381594807, 0.468641703))
            ThreePointArc((0.381594807, 0.468641703), (0.38478126, 0.512633483), (0.377406248, 0.556119567))
            ThreePointArc((0.377406248, 0.556119567), (0.316958398, 0.689104808), (0.240244136, 0.81341868))
            add(Edge.make_bspline(
                [(0.240244136, 0.81341868), (-0.178053426, 1.454553053), (-1.120854898, 1.454553053)],
                knots=[0.342748392, 0.342748392, 0.342748392, 1.381331695, 1.381331695, 1.381331695], degree=2, weights=[1, 0.868170926, 1]))
            Line((-1.120854898, 1.454553053), (-1.214475951, 1.454553068))
            add(Edge.make_bspline(
                [(-1.214475951, 1.454553068), (-2.800132813, 1.454553068), (-2.800132813, 0.203397992)],
                knots=[4.81203319, 4.81203319, 4.81203319, 6.344970327, 6.344970327, 6.344970327], degree=2, weights=[1, 0.720364542, 1]))
            Line((-2.800132813, 0.203397992), (-2.800132806, 0.073267738))
            add(Edge.make_bspline(
                [(-2.800132806, 0.073267738), (-2.800132806, -1.177887338), (-1.214475944, -1.177887338)],
                knots=[3.079807634, 3.079807634, 3.079807634, 4.612744771, 4.612744771, 4.612744771], degree=2, weights=[1, 0.720364542, 1]))
            Line((-1.214475944, -1.177887338), (-1.120854891, -1.177887375))
            add(Edge.make_bspline(
                [(-1.120854891, -1.177887375), (-0.178053419, -1.177887375), (0.240244143, -0.536753002)],
                knots=[1.760260959, 1.760260959, 1.760260959, 2.798844261, 2.798844261, 2.798844261], degree=2, weights=[1, 0.868170926, 1]))
            ThreePointArc((0.240244143, -0.536753002), (0.313994237, -0.417650167), (0.372658208, -0.290437354))
            ThreePointArc((0.372658208, -0.290437354), (0.384251196, -0.24211404), (0.382489087, -0.192450825))
            ThreePointArc((0.382489087, -0.192450825), (0.370484527, -0.171527836), (0.347824512, -0.163257123))
            Line((0.347824512, -0.163257123), (-0.58348421, -0.163257123))
            ThreePointArc((-0.58348421, -0.163257123), (-0.62125204, -0.175257922), (-0.645165579, -0.206858093))
            add(Edge.make_bspline(
                [(-1.141657158, -0.577741646), (-0.776549247, -0.578100851), (-0.645165579, -0.206858093)],
                knots=[5.955155363, 5.955155363, 5.955155363, 7.020735545, 7.020735545, 7.020735545], degree=2, weights=[1, 0.86139323, 1]))
            add(Edge.make_bspline(
                [(-1.201450314, 0.854894524), (-1.823540048, 0.823436889), (-1.793554178, 0.104979402), (-1.763568309, -0.613478086), (-1.141657158, -0.577741646)],
                knots=[3.181025595, 3.181025595, 3.181025595, 4.754799698, 4.754799698, 6.328573801, 6.328573801, 6.328573801], degree=2, weights=[1, 0.706053195, 1, 0.706053195, 1]))
            add(Edge.make_bspline(
                [(-0.645165584, 0.487388037), (-0.79140441, 0.900606071), (-1.201450314, 0.854894524)],
                knots=[2.404042441, 2.404042441, 2.404042441, 3.565685694, 3.565685694, 3.565685694], degree=2, weights=[1, 0.836012096, 1]))
            ThreePointArc((-0.645165584, 0.487388037), (-0.621252025, 0.455787841), (-0.583484164, 0.443787032))
        make_face()
        with BuildLine():
            Line((-3.89178871, 0.443787032), (-2.955953786, 0.443787032))
            ThreePointArc((-2.955953786, 0.443787032), (-2.937643536, 0.451874816), (-2.926709688, 0.468641703))
            ThreePointArc((-2.926709688, 0.468641703), (-2.923523234, 0.512633483), (-2.930898247, 0.556119567))
            ThreePointArc((-2.930898247, 0.556119567), (-2.991346096, 0.689104808), (-3.068060358, 0.81341868))
            add(Edge.make_bspline(
                [(-3.068060358, 0.81341868), (-3.48635792, 1.454553053), (-4.429159392, 1.454553053)],
                knots=[0.342748392, 0.342748392, 0.342748392, 1.381331695, 1.381331695, 1.381331695], degree=2, weights=[1, 0.868170926, 1]))
            Line((-4.429159392, 1.454553053), (-4.522780446, 1.454553068))
            add(Edge.make_bspline(
                [(-4.522780446, 1.454553068), (-6.108437307, 1.454553068), (-6.108437307, 0.203397992)],
                knots=[4.81203319, 4.81203319, 4.81203319, 6.344970327, 6.344970327, 6.344970327], degree=2, weights=[1, 0.720364542, 1]))
            Line((-6.108437307, 0.203397992), (-6.108437352, 0.073267738))
            add(Edge.make_bspline(
                [(-6.108437352, 0.073267738), (-6.108437352, -1.177887338), (-4.52278049, -1.177887338)],
                knots=[3.079807634, 3.079807634, 3.079807634, 4.612744771, 4.612744771, 4.612744771], degree=2, weights=[1, 0.720364542, 1]))
            Line((-4.52278049, -1.177887338), (-4.429159437, -1.177887375))
            add(Edge.make_bspline(
                [(-4.429159437, -1.177887375), (-3.486357965, -1.177887375), (-3.068060402, -0.536753002)],
                knots=[1.760260959, 1.760260959, 1.760260959, 2.798844261, 2.798844261, 2.798844261], degree=2, weights=[1, 0.868170926, 1]))
            ThreePointArc((-3.068060402, -0.536753002), (-2.994310308, -0.417650167), (-2.935646337, -0.290437354))
            ThreePointArc((-2.935646337, -0.290437354), (-2.92405335, -0.24211404), (-2.925815458, -0.192450825))
            ThreePointArc((-2.925815458, -0.192450825), (-2.937820019, -0.171527836), (-2.960480033, -0.163257123))
            Line((-2.960480033, -0.163257123), (-3.891788755, -0.163257123))
            ThreePointArc((-3.891788755, -0.163257123), (-3.929556585, -0.175257922), (-3.953470124, -0.206858093))
            add(Edge.make_bspline(
                [(-4.449961703, -0.577741646), (-4.084853792, -0.578100851), (-3.953470124, -0.206858093)],
                knots=[5.955155363, 5.955155363, 5.955155363, 7.020735545, 7.020735545, 7.020735545], degree=2, weights=[1, 0.86139323, 1]))
            add(Edge.make_bspline(
                [(-4.509754859, 0.854894524), (-5.131844593, 0.82343689), (-5.101858724, 0.104979402), (-5.071872854, -0.613478086), (-4.449961703, -0.577741646)],
                knots=[3.181025595, 3.181025595, 3.181025595, 4.754799698, 4.754799698, 6.328573801, 6.328573801, 6.328573801], degree=2, weights=[1, 0.706053195, 1, 0.706053195, 1]))
            add(Edge.make_bspline(
                [(-3.95347013, 0.487388037), (-4.099708956, 0.900606071), (-4.509754859, 0.854894524)],
                knots=[2.40404244, 2.40404244, 2.40404244, 3.565685694, 3.565685694, 3.565685694], degree=2, weights=[1, 0.836012096, 1]))
            ThreePointArc((-3.95347013, 0.487388037), (-3.92955657, 0.455787841), (-3.89178871, 0.443787032))
        make_face()
    extrude(amount=CUT_EXTRUDE3_DEPTH, mode=Mode.SUBTRACT)

    # Sketch7 → Cut-Extrude4 (cut, through all)
    with BuildSketch(Plane(origin=(0, 1.5, 0), x_dir=(1, 0, 0), z_dir=(0, 1, 0))):
        with Locations((-2.868336067, 10.6)):
            Rectangle(SKETCH7_W, SKETCH7_H)
    extrude(amount=-CUT_EXTRUDE4_DEPTH, mode=Mode.SUBTRACT)

    # Sketch8 → Cut-Extrude5 (cut, through all)
    with BuildSketch(Plane(origin=(0, 1.5, 0), x_dir=(1, 0, 0), z_dir=(0, 1, 0))):
        with Locations((-4.294025381, 1.75)):
            Rectangle(SKETCH8_W, SKETCH8_H)
    extrude(amount=-CUT_EXTRUDE5_DEPTH, mode=Mode.SUBTRACT)


solid = part.part
